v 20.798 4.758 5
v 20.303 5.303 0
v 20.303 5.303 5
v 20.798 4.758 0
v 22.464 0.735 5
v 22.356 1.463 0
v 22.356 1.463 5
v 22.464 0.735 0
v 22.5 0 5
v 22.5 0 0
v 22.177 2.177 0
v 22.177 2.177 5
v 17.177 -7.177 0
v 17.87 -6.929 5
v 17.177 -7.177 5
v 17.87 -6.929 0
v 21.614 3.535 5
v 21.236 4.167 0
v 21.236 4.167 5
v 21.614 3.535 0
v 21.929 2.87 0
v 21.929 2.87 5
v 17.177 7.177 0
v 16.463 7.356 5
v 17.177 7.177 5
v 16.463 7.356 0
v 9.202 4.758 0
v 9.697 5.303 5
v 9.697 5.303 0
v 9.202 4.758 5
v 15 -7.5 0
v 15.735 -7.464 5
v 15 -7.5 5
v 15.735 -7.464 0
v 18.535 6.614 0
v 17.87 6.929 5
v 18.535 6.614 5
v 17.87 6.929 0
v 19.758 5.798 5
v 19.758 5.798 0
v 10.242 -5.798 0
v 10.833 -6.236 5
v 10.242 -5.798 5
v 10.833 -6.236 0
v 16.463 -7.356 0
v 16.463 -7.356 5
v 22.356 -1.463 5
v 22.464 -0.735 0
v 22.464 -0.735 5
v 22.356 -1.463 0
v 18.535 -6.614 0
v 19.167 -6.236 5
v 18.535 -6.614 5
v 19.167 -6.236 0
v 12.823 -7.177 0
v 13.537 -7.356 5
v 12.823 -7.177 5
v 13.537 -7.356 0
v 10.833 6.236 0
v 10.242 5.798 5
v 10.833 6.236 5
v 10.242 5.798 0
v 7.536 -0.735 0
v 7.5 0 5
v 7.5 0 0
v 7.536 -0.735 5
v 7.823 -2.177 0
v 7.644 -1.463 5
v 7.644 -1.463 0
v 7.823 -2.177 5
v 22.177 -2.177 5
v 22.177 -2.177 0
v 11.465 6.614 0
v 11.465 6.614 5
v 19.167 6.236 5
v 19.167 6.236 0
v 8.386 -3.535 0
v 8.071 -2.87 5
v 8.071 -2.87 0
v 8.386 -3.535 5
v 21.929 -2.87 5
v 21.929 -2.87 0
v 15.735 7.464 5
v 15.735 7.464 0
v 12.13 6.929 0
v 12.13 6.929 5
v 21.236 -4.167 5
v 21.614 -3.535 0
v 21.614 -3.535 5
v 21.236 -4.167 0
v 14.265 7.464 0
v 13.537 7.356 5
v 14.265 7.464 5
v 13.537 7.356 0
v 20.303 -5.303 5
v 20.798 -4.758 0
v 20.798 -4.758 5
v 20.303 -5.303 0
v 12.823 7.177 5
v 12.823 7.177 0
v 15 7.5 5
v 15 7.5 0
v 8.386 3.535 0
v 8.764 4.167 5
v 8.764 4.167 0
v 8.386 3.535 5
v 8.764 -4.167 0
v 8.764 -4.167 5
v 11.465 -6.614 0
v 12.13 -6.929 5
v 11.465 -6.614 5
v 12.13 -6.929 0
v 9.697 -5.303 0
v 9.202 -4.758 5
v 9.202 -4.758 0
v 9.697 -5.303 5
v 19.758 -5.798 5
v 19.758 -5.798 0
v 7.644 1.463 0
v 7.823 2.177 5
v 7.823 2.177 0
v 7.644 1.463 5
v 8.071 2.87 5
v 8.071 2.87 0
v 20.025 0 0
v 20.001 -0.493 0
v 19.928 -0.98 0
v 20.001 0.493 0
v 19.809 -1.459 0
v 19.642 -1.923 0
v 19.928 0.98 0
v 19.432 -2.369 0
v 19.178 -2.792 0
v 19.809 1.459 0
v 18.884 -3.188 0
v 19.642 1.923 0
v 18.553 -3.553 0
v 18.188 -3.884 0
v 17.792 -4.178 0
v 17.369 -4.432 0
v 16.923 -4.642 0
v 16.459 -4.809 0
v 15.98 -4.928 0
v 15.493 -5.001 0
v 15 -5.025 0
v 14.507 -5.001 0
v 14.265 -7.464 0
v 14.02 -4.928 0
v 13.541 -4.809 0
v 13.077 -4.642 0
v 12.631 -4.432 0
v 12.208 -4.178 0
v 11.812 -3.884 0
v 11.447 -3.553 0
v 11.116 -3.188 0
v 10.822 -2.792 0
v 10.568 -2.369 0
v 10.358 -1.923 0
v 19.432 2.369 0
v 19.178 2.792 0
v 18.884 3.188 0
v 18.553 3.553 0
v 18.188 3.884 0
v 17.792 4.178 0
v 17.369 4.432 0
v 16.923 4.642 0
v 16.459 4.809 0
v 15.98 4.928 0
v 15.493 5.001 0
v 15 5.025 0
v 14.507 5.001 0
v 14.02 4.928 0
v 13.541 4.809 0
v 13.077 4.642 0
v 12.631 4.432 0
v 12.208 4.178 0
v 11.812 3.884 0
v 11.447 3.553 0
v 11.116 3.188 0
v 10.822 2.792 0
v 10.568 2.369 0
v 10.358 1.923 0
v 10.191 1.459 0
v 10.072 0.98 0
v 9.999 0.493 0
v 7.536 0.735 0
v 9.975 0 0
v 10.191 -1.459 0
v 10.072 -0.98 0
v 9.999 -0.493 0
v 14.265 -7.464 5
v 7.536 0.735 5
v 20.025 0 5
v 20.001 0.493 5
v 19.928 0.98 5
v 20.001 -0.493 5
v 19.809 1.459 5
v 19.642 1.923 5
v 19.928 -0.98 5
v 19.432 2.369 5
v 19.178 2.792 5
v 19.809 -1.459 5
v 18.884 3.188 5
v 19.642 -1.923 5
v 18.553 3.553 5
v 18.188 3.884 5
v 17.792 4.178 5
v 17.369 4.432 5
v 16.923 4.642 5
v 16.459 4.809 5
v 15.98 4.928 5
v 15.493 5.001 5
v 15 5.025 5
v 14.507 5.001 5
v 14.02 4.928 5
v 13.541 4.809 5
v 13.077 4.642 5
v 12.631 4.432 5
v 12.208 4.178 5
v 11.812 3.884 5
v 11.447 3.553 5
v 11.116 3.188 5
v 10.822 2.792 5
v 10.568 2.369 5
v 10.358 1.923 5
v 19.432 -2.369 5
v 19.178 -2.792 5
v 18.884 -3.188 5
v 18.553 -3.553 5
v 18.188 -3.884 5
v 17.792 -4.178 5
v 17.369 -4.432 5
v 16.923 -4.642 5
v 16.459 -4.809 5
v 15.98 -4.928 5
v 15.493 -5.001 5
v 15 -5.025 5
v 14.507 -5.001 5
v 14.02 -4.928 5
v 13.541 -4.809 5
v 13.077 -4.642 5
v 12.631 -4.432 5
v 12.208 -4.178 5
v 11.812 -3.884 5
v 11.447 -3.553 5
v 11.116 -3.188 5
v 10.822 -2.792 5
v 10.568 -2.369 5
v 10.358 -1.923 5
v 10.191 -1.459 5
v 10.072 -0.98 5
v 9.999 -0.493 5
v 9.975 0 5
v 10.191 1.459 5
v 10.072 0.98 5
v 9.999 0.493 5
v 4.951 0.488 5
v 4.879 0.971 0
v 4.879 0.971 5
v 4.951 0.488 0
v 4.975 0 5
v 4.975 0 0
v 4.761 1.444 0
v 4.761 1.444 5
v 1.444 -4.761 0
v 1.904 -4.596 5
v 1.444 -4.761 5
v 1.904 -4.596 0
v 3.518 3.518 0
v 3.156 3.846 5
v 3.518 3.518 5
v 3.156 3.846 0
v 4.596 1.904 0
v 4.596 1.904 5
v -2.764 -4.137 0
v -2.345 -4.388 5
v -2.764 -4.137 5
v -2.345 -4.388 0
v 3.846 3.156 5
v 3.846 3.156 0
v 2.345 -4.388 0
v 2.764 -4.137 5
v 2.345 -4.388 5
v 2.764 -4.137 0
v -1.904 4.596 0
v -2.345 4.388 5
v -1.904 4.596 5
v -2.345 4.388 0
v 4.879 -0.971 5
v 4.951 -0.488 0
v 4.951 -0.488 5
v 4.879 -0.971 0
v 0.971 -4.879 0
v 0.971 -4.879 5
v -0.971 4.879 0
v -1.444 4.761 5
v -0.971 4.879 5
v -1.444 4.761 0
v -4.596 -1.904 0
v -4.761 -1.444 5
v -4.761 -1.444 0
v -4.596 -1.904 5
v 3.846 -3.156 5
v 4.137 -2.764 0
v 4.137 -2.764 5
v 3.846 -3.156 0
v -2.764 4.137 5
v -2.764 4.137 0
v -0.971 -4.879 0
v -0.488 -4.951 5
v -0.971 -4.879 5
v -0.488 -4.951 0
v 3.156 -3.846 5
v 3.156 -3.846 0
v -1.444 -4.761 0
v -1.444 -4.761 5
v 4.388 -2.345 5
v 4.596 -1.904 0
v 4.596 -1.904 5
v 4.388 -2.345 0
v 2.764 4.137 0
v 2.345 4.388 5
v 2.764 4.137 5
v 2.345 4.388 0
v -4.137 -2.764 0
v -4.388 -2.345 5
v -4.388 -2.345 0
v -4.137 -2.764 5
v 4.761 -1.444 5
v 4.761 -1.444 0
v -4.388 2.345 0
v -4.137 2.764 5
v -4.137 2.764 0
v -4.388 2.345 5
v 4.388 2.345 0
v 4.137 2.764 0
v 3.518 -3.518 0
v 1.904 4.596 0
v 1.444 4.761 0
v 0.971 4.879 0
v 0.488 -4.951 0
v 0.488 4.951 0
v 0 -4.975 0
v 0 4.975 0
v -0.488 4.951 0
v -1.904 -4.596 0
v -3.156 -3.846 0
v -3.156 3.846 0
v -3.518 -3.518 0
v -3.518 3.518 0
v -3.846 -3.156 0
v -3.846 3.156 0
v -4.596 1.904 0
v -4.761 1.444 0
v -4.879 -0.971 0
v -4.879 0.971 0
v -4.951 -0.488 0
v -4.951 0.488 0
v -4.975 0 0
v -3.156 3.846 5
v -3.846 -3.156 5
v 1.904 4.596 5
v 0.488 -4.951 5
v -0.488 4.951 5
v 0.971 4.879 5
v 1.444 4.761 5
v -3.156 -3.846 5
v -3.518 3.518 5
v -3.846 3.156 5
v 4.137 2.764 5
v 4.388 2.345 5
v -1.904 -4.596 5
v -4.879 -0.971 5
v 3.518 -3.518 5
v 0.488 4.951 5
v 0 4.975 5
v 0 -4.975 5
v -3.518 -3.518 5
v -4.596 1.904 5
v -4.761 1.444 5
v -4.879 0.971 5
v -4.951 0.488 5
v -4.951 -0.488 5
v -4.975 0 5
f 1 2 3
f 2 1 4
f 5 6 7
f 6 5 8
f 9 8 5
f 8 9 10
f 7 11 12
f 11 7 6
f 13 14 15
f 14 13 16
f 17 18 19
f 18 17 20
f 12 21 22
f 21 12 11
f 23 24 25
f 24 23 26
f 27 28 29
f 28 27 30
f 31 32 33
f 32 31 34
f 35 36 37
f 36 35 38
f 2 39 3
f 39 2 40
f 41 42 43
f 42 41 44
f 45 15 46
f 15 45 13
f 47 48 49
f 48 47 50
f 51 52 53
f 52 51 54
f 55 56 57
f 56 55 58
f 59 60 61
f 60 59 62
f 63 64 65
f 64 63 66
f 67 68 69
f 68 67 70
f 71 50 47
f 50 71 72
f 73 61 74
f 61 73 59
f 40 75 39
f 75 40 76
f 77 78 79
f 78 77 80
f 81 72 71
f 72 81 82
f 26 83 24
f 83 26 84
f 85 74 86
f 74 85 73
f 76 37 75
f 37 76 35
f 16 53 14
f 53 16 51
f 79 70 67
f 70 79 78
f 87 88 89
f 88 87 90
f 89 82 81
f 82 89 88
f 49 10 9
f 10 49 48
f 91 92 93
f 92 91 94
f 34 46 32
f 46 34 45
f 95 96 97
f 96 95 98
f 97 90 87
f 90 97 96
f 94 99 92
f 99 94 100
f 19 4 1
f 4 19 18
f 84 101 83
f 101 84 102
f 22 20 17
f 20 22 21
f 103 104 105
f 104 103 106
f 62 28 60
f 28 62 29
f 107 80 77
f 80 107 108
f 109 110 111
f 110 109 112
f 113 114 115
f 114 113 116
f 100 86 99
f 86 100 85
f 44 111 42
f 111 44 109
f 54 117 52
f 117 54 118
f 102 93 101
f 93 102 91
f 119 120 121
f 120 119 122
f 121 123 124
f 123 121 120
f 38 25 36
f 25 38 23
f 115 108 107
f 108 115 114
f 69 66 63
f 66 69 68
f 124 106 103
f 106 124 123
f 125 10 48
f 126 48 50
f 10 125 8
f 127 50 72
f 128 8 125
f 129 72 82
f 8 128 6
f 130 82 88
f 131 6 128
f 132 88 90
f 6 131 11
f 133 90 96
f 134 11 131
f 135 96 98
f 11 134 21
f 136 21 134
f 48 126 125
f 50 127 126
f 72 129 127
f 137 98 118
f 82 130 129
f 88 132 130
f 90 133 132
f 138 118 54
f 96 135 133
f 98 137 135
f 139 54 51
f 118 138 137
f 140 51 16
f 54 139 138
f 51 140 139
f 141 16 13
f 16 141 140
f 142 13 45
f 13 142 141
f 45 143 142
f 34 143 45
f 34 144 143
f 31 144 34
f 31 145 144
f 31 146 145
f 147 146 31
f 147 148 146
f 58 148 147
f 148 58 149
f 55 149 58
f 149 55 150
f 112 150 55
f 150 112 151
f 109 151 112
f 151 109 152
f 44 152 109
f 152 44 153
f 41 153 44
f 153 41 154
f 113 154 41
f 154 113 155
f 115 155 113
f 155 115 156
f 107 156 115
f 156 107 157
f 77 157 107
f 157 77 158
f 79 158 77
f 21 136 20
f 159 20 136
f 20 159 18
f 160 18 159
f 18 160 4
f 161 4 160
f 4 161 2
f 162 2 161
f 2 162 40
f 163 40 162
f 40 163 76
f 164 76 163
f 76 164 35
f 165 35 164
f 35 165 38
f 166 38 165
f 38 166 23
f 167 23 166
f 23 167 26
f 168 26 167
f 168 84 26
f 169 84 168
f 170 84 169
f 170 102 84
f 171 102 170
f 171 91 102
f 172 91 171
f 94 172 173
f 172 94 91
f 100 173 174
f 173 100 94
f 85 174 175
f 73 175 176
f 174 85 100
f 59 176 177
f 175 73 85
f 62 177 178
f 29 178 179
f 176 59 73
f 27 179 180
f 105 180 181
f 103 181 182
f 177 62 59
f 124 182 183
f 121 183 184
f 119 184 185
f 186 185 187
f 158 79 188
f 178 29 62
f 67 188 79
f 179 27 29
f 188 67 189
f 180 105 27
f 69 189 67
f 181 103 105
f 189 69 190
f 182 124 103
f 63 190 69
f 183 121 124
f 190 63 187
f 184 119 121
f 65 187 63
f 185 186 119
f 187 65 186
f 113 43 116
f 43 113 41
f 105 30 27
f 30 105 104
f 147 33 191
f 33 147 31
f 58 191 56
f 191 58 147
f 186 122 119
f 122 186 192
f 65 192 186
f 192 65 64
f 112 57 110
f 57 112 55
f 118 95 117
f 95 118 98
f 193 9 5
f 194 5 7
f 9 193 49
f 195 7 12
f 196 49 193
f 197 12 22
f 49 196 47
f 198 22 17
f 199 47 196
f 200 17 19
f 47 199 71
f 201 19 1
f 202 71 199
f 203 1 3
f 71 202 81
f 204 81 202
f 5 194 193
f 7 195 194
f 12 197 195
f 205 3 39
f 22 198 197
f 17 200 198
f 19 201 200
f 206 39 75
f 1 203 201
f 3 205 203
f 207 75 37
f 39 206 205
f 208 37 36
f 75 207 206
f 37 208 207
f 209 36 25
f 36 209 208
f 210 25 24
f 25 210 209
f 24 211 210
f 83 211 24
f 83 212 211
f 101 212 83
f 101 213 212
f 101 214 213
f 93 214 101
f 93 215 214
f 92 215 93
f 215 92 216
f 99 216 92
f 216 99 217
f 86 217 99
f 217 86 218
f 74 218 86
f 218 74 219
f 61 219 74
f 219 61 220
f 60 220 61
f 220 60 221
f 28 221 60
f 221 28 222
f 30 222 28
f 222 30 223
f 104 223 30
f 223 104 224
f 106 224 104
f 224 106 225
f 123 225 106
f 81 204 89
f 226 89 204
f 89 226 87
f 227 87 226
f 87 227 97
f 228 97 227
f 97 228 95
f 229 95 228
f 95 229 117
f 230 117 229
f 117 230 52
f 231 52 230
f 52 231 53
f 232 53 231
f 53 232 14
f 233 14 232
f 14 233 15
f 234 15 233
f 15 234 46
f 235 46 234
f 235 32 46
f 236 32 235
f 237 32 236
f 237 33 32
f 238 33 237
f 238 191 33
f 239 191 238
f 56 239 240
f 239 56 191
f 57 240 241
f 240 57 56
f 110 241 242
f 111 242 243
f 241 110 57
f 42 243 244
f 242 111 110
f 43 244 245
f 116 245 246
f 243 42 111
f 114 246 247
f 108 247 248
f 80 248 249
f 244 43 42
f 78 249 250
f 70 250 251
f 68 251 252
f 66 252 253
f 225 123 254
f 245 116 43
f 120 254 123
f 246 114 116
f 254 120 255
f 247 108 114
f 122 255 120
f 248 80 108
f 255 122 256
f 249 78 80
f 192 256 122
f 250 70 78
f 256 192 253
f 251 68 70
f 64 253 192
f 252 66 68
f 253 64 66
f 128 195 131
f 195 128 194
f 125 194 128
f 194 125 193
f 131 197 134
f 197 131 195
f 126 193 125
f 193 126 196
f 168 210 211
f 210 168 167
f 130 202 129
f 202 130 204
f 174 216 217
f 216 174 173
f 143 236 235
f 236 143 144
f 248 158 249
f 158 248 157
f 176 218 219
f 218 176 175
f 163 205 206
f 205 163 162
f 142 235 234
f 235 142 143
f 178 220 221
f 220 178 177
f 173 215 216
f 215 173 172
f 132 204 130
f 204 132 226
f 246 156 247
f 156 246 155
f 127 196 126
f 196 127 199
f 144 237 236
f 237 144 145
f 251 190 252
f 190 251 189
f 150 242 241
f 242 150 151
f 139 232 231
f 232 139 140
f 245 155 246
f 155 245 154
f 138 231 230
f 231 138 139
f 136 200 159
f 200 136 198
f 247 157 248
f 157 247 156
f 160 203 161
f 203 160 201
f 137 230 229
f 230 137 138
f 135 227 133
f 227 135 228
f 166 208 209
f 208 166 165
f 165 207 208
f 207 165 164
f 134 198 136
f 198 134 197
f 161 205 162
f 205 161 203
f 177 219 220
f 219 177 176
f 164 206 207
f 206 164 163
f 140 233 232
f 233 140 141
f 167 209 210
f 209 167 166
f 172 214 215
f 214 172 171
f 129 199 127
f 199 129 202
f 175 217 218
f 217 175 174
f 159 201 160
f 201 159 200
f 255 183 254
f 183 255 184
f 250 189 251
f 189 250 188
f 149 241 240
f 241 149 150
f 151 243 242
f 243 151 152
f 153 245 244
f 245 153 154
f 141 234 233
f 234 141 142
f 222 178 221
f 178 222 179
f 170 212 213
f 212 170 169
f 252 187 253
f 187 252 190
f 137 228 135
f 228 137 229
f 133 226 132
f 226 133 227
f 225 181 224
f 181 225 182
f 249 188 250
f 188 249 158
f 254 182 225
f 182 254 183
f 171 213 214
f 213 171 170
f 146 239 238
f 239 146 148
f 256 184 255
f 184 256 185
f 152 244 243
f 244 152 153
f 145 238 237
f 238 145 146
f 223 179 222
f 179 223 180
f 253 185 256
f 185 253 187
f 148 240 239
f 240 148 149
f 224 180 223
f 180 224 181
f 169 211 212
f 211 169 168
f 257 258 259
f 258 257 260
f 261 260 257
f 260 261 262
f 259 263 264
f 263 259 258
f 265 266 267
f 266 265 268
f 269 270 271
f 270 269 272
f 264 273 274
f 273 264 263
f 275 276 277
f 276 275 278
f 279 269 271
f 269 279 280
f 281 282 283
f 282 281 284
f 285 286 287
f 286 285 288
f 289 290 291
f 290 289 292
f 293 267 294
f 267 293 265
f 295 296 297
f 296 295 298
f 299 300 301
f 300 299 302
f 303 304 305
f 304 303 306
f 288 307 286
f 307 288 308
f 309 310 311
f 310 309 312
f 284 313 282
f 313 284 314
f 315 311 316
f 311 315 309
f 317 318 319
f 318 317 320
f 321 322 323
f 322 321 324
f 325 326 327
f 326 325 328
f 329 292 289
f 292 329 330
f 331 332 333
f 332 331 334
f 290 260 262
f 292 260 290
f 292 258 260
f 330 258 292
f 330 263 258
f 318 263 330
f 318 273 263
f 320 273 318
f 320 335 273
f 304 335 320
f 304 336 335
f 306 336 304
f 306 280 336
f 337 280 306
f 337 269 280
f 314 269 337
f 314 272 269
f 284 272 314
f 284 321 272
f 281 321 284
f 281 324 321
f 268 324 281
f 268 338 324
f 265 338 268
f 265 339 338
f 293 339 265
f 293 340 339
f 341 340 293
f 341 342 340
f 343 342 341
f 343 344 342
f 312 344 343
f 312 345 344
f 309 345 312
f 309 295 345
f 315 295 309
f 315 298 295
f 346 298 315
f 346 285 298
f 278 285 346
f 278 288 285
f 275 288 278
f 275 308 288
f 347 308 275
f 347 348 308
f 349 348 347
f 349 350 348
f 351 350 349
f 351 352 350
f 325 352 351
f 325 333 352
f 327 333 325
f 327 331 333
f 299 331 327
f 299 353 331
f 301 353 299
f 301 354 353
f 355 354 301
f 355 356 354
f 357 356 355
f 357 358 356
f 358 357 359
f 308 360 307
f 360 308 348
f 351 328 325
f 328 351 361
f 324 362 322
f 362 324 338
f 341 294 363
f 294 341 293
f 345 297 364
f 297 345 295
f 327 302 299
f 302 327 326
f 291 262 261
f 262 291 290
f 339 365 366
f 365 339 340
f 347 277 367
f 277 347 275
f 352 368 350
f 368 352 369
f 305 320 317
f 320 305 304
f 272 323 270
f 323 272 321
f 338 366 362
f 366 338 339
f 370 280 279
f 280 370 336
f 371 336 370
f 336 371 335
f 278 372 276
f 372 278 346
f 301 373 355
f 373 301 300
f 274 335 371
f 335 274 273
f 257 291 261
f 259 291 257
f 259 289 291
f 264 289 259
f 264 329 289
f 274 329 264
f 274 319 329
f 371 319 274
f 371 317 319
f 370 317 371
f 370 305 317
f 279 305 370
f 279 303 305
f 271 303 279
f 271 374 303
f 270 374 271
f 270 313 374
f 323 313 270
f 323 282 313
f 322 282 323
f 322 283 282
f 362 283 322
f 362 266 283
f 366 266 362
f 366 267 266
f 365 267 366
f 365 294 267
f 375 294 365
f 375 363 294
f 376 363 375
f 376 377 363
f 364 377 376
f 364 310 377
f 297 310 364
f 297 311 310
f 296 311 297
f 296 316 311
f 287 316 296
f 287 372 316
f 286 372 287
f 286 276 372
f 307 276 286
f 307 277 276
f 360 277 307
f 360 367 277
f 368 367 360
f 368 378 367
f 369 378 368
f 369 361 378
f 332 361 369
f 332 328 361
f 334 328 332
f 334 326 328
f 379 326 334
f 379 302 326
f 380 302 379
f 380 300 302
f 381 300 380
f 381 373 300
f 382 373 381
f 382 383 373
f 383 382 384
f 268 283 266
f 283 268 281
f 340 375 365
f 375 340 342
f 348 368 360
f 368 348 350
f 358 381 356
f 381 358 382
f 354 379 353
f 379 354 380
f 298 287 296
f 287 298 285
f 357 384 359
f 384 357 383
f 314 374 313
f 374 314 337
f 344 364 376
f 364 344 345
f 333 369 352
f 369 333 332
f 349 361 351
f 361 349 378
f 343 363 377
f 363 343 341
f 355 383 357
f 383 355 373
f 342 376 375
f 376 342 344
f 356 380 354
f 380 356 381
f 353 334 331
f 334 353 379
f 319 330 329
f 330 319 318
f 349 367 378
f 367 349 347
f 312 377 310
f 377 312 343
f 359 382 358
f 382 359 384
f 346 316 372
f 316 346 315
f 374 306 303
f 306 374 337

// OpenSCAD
$fn=64;

e=0.1/2;

cylinder(d=10-e,h=5);
translate([15,0,0])
difference(){
cylinder(d=15,h=5);
cylinder(d=10+e,h=30,center=true);
}
